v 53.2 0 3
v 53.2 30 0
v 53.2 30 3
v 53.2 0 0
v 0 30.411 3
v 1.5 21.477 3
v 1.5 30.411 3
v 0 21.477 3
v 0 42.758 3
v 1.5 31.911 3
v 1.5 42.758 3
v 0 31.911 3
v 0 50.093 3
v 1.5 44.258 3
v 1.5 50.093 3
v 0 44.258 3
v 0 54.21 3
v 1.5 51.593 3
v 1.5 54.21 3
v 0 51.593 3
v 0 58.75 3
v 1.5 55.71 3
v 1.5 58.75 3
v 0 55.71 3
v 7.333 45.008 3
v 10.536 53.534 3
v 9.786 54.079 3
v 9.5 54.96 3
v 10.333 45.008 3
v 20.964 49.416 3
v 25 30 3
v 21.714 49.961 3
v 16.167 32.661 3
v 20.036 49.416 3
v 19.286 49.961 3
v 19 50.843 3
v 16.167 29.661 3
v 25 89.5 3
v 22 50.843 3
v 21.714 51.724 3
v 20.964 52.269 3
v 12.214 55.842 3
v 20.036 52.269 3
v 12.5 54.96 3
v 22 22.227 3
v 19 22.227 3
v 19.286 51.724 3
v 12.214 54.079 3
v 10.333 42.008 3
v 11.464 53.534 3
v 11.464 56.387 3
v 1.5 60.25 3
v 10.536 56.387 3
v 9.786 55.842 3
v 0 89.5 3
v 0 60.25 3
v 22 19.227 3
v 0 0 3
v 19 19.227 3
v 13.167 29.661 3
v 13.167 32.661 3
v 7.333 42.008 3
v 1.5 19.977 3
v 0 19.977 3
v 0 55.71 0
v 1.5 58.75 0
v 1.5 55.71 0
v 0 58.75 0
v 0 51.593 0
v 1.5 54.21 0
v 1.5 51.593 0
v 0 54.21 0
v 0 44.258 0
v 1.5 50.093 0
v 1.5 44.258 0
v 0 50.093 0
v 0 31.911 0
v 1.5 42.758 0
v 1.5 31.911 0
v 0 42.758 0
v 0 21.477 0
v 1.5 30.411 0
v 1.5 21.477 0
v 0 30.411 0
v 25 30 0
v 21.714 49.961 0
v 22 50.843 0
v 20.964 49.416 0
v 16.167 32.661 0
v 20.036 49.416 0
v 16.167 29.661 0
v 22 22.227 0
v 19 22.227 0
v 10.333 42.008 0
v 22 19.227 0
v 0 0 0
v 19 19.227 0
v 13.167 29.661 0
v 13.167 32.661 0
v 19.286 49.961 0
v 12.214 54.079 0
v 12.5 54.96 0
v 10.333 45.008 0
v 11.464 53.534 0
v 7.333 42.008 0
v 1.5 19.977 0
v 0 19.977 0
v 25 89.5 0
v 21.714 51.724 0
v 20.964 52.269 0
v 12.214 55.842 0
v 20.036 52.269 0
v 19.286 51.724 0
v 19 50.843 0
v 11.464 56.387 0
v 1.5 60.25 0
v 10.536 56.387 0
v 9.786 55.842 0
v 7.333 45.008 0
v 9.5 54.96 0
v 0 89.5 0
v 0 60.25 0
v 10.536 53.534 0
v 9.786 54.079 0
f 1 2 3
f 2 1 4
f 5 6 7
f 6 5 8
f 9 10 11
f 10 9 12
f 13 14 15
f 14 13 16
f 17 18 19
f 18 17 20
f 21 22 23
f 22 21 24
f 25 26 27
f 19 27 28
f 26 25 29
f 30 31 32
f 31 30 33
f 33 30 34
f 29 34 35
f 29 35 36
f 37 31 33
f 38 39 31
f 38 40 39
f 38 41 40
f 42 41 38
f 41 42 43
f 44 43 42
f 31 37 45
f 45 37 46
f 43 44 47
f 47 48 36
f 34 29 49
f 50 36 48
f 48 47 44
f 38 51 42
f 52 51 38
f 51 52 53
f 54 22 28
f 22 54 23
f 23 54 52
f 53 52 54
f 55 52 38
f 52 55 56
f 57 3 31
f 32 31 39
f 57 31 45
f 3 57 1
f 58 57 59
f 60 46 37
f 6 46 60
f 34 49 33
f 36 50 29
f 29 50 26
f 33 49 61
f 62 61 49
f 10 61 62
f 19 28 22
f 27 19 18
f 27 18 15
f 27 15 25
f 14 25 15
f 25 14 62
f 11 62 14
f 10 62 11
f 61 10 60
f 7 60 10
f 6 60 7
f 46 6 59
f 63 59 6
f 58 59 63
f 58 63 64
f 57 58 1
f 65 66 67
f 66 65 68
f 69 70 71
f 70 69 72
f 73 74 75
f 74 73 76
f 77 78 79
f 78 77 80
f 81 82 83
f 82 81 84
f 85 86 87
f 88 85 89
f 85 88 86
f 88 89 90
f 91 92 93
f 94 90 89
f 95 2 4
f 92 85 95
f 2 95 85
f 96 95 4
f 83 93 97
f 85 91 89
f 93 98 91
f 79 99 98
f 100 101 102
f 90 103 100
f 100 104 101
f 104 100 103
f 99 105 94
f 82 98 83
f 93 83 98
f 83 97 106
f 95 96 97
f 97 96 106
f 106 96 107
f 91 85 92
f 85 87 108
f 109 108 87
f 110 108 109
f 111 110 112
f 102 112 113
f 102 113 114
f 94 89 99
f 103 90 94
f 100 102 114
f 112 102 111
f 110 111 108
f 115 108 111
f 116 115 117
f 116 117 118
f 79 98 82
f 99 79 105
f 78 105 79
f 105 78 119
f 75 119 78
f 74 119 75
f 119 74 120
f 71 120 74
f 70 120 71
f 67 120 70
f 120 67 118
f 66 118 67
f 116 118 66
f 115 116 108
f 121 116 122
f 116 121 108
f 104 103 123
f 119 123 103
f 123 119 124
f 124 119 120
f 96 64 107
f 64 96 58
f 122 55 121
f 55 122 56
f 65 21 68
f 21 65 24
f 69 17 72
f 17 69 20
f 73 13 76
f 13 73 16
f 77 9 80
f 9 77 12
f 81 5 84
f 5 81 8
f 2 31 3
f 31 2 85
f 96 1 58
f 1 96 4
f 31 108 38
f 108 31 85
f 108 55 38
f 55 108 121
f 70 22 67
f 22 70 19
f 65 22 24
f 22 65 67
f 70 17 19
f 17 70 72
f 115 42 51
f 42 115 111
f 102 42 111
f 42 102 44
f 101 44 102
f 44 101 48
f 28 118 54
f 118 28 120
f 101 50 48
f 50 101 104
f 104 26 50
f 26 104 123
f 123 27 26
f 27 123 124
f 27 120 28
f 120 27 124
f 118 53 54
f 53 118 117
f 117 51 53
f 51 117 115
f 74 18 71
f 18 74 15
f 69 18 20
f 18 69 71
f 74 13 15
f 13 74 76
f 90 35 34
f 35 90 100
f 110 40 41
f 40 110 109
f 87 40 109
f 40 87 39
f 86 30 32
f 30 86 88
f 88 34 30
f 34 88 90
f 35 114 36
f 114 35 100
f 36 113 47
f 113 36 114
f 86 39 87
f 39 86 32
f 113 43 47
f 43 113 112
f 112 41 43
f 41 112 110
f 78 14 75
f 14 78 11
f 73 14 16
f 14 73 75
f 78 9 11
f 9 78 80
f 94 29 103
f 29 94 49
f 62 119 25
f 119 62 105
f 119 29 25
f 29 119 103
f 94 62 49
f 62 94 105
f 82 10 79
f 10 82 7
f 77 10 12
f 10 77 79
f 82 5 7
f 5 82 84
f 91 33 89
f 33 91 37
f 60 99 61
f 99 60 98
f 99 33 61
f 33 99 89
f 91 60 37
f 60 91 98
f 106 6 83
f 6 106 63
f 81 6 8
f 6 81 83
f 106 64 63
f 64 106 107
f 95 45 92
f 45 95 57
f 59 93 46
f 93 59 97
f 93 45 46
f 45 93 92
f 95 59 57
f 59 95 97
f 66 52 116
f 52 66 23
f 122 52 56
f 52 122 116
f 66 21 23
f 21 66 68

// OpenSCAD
/* [Spool] */
D_out=199; //spool outer diameter
D_in=80;   //spool inner diameter
W=66.5;    //spool width
/* [PLA] */
dia=1.75;  //PLA line diameter
vof=0.75;  //packing efficiency
/* [Ruler] */
rule_w=25; //rule width
rule_t=3;  //rule thickness
rule_h=30; //rule head
base_width_ratio=0.8; //base width ratio

    module base(W,rule_w,rule_t,rule_h,base_width_ratio){
    cube(size=[W*base_width_ratio,rule_h,rule_t]);
    }

    
    module rule(W,D_out,D_in,rule_w,rule_t,rule_h){
    cube(size=[rule_w,rule_h+(D_out-D_in)*0.5,rule_t]);
    }

pi=3.14159265358979; //pi
    
fl_0=0; //meter
    
fl_25=25; //meter
    
fl_50=50; //meter

fl_100=100; //meter

fl_200=200; //meter

fl_300=300; //meter
    
 module p1(fl_0,rule_t){
     p_0=(D_out-sqrt((((0.25*pi*dia*dia*fl_0*1000)/vof)/W+0.25*pi*D_in*D_in)*4/pi))/2-rule_t/4;
    translate([0,p_0,0])
     cube(size=[0.5*rule_t,0.5*rule_t,rule_t]);  
    }  
 module p2(fl_0,rule_t){
     p_0=(D_out-sqrt((((0.25*pi*dia*dia*fl_0*1000)/vof)/W+0.25*pi*D_in*D_in)*4/pi))/2-rule_t/4;
    translate([0,p_0,0])
     cube(size=[0.5*rule_t,0.5*rule_t,rule_t]);
     
     translate([0.5*rule_t+(fl_0/50)*(rule_w-2.0*rule_t),p_0+0.25*rule_t,0])
     
     cylinder(rule_t,rule_t/2,rule_t/2,$fn=10);
      
    }

 module p3(fl_0,rule_t){
    p_0=(D_out-sqrt((((0.25*pi*dia*dia*fl_0*1000)/vof)/W+0.25*pi*D_in*D_in)*4/pi))/2-rule_t/4;
     translate([0,p_0,0])
     cube(size=[0.5*rule_t,0.5*rule_t,rule_t]);
     
    translate([0.5*rule_t+(fl_0/300)*(rule_w-2.5*rule_t),p_0-0.25*rule_t,0])
     
      cube(size=[rule_t,rule_t,rule_t]);
    }
    
    difference(){
    union(){
        base(W,rule_w,rule_t,rule_h,base_width_ratio);
        rule(W,D_out,D_in,rule_w,rule_t,rule_h);
        }
        
    p1(fl_0,rule_t); 
    p2(fl_25,rule_t);    
    p2(fl_50,rule_t);     
    p3(fl_100,rule_t);     
    p3(fl_200,rule_t);       
    p3(fl_300,rule_t);    
    }
    
    
